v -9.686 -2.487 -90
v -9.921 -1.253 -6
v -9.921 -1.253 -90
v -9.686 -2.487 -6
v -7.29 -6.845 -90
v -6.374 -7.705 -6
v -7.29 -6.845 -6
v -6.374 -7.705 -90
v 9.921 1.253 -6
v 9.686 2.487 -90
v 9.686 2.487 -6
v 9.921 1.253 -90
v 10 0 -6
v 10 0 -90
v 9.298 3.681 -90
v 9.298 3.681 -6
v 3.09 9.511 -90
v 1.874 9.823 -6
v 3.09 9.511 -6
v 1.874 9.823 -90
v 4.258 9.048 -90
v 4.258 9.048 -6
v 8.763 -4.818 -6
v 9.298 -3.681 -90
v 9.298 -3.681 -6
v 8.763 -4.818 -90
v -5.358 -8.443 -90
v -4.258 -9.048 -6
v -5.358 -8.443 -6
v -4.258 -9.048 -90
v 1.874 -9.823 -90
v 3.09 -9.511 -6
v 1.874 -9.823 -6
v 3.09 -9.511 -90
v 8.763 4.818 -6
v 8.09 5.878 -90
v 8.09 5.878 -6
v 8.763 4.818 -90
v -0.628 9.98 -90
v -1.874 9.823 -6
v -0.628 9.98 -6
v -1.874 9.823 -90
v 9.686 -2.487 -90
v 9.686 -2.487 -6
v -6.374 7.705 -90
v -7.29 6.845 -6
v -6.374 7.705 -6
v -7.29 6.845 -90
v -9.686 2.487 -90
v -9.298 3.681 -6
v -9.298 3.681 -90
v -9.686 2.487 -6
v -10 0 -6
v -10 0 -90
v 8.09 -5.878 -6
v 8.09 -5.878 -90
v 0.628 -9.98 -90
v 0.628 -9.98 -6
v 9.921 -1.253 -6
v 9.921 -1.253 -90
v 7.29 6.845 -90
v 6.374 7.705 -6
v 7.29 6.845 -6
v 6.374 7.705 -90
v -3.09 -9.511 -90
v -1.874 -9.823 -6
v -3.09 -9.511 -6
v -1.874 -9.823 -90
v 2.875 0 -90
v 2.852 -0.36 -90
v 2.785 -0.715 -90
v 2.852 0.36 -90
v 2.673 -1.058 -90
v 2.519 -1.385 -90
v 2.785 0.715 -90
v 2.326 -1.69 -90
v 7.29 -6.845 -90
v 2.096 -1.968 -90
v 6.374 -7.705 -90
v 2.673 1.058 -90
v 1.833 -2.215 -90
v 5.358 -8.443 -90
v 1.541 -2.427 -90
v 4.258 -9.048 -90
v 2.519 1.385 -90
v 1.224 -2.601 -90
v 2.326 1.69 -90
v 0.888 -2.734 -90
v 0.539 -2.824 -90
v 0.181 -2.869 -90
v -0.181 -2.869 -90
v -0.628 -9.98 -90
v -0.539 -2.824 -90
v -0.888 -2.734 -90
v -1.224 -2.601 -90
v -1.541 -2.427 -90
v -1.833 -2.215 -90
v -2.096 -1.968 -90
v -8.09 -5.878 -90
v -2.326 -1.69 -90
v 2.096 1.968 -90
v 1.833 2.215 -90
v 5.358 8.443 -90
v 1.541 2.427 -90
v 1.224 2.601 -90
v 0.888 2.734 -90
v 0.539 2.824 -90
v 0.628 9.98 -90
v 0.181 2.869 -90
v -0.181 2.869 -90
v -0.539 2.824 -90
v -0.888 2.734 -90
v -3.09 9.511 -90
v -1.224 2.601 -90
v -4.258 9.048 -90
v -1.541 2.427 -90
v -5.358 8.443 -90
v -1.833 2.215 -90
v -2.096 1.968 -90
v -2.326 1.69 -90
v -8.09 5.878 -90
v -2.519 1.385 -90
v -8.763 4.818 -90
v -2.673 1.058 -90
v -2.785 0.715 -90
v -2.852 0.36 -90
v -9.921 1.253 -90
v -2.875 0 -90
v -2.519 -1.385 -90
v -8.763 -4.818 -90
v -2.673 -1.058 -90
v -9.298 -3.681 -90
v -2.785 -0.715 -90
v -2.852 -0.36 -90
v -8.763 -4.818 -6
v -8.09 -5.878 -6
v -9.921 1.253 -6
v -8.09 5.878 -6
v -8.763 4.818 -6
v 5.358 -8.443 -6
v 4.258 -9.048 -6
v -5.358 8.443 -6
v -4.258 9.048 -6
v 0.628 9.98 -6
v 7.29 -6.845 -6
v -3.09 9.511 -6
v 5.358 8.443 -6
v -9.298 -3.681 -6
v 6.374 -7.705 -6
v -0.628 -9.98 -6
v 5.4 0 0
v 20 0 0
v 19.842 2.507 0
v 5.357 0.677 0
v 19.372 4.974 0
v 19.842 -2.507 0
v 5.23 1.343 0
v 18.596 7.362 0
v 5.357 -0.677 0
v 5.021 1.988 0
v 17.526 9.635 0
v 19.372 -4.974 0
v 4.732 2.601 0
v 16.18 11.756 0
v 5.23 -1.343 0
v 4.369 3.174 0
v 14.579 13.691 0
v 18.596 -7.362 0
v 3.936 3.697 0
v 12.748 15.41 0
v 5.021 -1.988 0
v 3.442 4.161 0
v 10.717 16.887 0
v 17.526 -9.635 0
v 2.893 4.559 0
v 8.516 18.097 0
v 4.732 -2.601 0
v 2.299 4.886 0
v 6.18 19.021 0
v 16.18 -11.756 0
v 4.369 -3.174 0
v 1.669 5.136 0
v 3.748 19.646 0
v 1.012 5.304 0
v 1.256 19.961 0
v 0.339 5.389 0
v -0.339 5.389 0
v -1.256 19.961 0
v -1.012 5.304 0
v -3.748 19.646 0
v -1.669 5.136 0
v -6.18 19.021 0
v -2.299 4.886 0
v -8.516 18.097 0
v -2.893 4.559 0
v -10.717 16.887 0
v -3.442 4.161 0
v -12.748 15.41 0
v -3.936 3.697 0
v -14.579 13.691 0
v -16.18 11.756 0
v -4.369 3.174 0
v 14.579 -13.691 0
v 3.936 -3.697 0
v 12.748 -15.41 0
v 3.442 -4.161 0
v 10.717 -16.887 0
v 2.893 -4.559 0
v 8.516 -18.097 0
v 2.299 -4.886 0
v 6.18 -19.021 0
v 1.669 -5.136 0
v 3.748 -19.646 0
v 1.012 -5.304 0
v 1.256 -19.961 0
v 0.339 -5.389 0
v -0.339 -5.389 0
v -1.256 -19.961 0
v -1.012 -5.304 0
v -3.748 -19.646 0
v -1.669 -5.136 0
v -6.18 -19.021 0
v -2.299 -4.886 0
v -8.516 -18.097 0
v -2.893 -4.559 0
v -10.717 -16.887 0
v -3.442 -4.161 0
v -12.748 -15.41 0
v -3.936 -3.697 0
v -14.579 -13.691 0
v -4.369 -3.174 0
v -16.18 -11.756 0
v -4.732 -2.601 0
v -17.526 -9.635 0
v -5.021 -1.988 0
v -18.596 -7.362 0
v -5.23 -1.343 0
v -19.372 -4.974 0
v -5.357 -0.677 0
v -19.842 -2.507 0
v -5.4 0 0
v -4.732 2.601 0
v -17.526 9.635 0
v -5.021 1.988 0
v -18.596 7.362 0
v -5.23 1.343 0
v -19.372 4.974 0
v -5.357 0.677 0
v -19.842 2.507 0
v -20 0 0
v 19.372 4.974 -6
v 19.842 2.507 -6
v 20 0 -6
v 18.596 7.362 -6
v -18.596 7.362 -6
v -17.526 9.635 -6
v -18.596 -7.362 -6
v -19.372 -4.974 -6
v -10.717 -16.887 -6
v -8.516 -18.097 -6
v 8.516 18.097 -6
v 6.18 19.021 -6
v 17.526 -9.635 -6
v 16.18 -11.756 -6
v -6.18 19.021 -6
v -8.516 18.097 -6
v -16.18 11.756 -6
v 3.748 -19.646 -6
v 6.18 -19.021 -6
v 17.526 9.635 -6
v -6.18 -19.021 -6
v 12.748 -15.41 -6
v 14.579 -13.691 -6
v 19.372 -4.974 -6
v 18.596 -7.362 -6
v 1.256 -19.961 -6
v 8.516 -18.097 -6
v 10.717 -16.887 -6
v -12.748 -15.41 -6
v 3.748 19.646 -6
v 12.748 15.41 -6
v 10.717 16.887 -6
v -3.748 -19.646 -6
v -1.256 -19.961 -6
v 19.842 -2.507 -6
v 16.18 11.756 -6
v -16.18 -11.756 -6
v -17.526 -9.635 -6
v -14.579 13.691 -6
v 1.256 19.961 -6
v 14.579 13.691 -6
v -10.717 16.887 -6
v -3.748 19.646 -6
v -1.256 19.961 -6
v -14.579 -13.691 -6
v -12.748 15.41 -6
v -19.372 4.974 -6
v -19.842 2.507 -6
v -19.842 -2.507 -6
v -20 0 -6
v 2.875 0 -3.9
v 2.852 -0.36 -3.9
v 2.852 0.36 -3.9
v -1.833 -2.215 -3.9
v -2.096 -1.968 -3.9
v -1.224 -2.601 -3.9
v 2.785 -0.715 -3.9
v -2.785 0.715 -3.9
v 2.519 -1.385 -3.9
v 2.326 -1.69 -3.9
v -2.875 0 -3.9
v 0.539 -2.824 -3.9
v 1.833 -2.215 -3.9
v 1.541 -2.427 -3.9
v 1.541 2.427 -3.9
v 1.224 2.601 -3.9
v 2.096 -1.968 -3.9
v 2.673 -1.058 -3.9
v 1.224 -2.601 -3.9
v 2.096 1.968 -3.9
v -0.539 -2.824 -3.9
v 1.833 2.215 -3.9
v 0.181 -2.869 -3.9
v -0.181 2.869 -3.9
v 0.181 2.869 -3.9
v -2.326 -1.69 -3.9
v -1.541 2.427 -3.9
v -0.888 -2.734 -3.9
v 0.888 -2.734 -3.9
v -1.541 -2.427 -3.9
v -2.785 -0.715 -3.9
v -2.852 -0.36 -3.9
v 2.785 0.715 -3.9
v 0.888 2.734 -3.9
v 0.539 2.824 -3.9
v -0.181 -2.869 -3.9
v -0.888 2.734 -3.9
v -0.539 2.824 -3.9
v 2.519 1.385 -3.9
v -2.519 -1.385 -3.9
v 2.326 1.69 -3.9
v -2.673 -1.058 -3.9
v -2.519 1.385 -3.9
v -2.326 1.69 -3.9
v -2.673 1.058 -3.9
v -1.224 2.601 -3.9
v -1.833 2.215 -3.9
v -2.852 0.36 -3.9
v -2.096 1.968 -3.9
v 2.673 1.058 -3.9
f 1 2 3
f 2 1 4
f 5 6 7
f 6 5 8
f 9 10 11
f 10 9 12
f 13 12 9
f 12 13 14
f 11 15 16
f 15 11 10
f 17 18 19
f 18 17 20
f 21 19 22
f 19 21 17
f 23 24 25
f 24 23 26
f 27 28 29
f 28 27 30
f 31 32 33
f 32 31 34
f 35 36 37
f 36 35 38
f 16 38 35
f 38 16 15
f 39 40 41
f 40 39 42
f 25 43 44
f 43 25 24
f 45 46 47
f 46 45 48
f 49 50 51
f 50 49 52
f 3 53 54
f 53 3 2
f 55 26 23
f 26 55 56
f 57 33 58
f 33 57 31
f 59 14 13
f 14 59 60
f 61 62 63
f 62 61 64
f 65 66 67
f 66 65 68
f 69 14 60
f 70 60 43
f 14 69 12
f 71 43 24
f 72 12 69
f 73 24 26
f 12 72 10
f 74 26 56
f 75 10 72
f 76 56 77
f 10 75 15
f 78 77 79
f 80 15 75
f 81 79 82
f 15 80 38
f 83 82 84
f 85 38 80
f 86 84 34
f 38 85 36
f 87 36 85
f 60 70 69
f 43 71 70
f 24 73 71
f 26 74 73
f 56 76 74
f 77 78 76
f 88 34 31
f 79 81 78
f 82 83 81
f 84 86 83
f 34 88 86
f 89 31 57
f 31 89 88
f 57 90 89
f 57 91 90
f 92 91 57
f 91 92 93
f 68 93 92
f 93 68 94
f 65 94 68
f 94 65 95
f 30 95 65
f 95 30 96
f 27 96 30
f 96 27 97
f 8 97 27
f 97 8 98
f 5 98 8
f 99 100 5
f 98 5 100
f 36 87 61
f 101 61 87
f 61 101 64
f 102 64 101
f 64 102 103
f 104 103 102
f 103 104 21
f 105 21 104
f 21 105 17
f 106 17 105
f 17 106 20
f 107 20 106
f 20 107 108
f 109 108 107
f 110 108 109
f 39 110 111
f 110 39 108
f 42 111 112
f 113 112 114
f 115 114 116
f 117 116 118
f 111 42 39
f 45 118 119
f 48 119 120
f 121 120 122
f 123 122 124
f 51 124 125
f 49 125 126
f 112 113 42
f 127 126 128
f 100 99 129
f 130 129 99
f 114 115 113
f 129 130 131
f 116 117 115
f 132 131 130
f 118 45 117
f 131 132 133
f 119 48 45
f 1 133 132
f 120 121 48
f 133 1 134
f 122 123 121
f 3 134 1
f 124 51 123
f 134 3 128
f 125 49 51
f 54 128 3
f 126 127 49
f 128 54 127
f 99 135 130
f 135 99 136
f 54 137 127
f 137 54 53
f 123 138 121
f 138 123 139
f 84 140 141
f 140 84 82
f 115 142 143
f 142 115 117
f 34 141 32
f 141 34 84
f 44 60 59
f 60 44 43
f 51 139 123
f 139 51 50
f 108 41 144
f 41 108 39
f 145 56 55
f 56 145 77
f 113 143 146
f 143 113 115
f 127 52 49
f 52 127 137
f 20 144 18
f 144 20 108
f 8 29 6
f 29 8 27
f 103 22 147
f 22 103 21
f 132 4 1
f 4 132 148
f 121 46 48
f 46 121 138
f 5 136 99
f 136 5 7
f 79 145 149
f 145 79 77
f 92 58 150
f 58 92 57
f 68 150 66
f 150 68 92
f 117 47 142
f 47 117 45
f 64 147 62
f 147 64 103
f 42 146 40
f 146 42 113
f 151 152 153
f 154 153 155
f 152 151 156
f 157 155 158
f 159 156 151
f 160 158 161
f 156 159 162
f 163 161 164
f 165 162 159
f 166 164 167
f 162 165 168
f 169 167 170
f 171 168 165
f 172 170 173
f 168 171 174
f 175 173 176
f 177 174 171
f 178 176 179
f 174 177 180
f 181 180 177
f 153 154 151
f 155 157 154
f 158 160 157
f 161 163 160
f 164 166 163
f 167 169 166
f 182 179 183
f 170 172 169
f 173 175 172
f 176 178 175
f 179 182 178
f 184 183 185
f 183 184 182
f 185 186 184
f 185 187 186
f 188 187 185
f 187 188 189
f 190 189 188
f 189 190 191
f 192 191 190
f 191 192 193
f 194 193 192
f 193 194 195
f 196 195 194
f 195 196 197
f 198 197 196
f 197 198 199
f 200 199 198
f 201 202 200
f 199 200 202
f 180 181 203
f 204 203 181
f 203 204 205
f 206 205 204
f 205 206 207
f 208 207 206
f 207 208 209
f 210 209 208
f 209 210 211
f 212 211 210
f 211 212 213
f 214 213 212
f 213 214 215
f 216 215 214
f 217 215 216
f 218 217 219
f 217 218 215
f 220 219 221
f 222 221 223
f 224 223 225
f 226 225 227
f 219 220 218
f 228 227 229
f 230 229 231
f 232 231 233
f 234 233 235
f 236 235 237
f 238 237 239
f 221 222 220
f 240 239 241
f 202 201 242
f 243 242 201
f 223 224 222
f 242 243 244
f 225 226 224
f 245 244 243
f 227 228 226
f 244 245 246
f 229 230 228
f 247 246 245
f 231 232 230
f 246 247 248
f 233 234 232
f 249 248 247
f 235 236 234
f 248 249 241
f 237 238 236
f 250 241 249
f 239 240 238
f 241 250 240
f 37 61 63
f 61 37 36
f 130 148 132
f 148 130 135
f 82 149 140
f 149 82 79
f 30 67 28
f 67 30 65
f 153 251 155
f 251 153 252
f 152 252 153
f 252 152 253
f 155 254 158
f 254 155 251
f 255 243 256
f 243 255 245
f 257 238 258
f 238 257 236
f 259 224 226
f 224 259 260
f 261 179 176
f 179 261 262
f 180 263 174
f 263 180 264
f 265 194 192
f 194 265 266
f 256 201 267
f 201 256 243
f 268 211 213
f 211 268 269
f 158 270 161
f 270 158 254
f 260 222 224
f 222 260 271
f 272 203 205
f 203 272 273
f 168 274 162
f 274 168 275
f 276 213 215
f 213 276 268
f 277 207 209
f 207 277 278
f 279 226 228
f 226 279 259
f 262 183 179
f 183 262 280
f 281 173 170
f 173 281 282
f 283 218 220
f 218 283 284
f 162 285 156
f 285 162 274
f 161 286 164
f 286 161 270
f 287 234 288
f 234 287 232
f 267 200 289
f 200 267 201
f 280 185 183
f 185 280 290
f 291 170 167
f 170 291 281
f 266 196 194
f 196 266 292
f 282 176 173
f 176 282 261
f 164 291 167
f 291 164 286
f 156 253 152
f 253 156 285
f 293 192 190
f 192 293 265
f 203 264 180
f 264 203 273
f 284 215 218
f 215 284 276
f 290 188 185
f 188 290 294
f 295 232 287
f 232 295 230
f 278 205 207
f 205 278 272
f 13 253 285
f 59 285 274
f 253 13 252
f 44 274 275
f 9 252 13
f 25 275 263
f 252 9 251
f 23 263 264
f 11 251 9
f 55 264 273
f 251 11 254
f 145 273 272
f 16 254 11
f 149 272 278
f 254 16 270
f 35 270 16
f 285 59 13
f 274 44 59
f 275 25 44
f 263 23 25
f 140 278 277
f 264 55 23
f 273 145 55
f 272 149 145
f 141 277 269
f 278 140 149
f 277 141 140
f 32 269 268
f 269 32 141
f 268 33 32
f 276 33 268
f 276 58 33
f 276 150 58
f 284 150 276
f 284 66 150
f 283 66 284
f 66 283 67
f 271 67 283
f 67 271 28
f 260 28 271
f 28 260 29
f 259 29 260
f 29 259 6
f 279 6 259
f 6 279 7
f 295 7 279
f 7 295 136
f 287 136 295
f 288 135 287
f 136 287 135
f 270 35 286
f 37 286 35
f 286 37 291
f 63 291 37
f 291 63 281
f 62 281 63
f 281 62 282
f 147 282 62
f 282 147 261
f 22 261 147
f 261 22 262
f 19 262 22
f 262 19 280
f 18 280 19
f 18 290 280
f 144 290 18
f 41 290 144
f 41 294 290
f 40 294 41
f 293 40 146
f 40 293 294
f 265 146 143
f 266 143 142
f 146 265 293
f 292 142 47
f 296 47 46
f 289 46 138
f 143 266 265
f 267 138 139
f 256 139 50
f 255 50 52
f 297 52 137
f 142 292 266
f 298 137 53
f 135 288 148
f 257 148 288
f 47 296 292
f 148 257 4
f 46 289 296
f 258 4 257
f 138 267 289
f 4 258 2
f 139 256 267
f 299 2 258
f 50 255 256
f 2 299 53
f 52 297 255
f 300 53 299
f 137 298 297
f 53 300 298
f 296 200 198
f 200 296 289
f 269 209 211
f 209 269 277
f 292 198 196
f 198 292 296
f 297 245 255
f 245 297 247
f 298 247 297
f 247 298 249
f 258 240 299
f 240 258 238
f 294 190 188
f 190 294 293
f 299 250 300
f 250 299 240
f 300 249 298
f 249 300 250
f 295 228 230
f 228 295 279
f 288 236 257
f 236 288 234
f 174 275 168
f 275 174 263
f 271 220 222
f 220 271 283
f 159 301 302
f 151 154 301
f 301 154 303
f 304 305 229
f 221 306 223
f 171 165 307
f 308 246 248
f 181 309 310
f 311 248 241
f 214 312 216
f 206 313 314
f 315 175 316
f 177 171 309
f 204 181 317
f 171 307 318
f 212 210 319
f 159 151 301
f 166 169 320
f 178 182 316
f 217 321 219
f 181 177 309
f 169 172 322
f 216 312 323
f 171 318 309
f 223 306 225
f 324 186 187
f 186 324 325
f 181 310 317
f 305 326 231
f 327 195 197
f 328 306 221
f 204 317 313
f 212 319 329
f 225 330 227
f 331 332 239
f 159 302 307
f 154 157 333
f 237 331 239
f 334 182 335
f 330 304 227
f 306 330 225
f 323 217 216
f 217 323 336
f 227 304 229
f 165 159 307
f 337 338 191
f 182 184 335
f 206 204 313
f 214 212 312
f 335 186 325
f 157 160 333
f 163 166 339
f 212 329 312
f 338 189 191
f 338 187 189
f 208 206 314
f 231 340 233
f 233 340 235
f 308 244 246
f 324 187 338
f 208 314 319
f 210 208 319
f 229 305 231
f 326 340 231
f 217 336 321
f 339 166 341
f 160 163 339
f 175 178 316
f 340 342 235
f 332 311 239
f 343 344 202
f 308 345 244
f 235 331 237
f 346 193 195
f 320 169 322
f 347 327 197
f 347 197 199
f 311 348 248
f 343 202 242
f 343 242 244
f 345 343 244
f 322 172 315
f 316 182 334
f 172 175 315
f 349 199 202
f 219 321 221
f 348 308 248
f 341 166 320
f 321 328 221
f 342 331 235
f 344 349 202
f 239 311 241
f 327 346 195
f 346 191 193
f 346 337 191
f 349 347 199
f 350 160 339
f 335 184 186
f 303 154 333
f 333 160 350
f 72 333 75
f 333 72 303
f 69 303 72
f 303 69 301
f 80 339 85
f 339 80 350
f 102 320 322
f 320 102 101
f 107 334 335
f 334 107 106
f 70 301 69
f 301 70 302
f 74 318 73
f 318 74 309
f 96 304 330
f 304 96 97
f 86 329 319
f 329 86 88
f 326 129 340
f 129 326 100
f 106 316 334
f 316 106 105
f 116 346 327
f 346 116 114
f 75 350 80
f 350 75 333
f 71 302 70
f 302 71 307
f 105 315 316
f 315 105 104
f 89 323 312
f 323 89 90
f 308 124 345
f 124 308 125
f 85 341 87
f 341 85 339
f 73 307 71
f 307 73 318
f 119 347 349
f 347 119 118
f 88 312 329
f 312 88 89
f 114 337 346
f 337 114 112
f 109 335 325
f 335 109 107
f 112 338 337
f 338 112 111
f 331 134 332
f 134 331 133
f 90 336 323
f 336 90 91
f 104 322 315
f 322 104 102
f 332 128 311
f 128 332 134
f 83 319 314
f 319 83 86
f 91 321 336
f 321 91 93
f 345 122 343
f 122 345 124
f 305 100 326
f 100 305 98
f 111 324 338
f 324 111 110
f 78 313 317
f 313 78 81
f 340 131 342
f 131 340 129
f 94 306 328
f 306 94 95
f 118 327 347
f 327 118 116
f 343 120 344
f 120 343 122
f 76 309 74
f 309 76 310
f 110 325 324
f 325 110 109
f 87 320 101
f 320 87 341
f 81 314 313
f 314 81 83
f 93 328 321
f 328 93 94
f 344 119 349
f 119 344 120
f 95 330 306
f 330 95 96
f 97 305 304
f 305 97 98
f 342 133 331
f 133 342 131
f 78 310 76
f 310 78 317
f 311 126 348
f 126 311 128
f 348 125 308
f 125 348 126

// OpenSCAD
$fn = 50;


difference() {
	union() {
		translate(v = [0, 0, -90.0000000000]) {
			cylinder(h = 90, r = 10.0000000000);
		}
		translate(v = [0, 0, -6.0000000000]) {
			cylinder(h = 6, r = 20.0000000000);
		}
	}
	union() {
		translate(v = [0, 0, 0]) {
			rotate(a = [0, 0, 0]) {
				difference() {
					union() {
						#translate(v = [0, 0, -90.0000000000]) {
							cylinder(h = 90, r = 2.6000000000);
						}
						#translate(v = [0, 0, -3.9000000000]) {
							cylinder(h = 3.9000000000, r1 = 2.8750000000, r2 = 5.4000000000);
						}
						#translate(v = [0, 0, -90.0000000000]) {
							cylinder(h = 90, r = 2.8750000000);
						}
						#translate(v = [0, 0, -90.0000000000]) {
							cylinder(h = 90, r = 2.6000000000);
						}
					}
					union();
				}
			}
		}
	}
}
